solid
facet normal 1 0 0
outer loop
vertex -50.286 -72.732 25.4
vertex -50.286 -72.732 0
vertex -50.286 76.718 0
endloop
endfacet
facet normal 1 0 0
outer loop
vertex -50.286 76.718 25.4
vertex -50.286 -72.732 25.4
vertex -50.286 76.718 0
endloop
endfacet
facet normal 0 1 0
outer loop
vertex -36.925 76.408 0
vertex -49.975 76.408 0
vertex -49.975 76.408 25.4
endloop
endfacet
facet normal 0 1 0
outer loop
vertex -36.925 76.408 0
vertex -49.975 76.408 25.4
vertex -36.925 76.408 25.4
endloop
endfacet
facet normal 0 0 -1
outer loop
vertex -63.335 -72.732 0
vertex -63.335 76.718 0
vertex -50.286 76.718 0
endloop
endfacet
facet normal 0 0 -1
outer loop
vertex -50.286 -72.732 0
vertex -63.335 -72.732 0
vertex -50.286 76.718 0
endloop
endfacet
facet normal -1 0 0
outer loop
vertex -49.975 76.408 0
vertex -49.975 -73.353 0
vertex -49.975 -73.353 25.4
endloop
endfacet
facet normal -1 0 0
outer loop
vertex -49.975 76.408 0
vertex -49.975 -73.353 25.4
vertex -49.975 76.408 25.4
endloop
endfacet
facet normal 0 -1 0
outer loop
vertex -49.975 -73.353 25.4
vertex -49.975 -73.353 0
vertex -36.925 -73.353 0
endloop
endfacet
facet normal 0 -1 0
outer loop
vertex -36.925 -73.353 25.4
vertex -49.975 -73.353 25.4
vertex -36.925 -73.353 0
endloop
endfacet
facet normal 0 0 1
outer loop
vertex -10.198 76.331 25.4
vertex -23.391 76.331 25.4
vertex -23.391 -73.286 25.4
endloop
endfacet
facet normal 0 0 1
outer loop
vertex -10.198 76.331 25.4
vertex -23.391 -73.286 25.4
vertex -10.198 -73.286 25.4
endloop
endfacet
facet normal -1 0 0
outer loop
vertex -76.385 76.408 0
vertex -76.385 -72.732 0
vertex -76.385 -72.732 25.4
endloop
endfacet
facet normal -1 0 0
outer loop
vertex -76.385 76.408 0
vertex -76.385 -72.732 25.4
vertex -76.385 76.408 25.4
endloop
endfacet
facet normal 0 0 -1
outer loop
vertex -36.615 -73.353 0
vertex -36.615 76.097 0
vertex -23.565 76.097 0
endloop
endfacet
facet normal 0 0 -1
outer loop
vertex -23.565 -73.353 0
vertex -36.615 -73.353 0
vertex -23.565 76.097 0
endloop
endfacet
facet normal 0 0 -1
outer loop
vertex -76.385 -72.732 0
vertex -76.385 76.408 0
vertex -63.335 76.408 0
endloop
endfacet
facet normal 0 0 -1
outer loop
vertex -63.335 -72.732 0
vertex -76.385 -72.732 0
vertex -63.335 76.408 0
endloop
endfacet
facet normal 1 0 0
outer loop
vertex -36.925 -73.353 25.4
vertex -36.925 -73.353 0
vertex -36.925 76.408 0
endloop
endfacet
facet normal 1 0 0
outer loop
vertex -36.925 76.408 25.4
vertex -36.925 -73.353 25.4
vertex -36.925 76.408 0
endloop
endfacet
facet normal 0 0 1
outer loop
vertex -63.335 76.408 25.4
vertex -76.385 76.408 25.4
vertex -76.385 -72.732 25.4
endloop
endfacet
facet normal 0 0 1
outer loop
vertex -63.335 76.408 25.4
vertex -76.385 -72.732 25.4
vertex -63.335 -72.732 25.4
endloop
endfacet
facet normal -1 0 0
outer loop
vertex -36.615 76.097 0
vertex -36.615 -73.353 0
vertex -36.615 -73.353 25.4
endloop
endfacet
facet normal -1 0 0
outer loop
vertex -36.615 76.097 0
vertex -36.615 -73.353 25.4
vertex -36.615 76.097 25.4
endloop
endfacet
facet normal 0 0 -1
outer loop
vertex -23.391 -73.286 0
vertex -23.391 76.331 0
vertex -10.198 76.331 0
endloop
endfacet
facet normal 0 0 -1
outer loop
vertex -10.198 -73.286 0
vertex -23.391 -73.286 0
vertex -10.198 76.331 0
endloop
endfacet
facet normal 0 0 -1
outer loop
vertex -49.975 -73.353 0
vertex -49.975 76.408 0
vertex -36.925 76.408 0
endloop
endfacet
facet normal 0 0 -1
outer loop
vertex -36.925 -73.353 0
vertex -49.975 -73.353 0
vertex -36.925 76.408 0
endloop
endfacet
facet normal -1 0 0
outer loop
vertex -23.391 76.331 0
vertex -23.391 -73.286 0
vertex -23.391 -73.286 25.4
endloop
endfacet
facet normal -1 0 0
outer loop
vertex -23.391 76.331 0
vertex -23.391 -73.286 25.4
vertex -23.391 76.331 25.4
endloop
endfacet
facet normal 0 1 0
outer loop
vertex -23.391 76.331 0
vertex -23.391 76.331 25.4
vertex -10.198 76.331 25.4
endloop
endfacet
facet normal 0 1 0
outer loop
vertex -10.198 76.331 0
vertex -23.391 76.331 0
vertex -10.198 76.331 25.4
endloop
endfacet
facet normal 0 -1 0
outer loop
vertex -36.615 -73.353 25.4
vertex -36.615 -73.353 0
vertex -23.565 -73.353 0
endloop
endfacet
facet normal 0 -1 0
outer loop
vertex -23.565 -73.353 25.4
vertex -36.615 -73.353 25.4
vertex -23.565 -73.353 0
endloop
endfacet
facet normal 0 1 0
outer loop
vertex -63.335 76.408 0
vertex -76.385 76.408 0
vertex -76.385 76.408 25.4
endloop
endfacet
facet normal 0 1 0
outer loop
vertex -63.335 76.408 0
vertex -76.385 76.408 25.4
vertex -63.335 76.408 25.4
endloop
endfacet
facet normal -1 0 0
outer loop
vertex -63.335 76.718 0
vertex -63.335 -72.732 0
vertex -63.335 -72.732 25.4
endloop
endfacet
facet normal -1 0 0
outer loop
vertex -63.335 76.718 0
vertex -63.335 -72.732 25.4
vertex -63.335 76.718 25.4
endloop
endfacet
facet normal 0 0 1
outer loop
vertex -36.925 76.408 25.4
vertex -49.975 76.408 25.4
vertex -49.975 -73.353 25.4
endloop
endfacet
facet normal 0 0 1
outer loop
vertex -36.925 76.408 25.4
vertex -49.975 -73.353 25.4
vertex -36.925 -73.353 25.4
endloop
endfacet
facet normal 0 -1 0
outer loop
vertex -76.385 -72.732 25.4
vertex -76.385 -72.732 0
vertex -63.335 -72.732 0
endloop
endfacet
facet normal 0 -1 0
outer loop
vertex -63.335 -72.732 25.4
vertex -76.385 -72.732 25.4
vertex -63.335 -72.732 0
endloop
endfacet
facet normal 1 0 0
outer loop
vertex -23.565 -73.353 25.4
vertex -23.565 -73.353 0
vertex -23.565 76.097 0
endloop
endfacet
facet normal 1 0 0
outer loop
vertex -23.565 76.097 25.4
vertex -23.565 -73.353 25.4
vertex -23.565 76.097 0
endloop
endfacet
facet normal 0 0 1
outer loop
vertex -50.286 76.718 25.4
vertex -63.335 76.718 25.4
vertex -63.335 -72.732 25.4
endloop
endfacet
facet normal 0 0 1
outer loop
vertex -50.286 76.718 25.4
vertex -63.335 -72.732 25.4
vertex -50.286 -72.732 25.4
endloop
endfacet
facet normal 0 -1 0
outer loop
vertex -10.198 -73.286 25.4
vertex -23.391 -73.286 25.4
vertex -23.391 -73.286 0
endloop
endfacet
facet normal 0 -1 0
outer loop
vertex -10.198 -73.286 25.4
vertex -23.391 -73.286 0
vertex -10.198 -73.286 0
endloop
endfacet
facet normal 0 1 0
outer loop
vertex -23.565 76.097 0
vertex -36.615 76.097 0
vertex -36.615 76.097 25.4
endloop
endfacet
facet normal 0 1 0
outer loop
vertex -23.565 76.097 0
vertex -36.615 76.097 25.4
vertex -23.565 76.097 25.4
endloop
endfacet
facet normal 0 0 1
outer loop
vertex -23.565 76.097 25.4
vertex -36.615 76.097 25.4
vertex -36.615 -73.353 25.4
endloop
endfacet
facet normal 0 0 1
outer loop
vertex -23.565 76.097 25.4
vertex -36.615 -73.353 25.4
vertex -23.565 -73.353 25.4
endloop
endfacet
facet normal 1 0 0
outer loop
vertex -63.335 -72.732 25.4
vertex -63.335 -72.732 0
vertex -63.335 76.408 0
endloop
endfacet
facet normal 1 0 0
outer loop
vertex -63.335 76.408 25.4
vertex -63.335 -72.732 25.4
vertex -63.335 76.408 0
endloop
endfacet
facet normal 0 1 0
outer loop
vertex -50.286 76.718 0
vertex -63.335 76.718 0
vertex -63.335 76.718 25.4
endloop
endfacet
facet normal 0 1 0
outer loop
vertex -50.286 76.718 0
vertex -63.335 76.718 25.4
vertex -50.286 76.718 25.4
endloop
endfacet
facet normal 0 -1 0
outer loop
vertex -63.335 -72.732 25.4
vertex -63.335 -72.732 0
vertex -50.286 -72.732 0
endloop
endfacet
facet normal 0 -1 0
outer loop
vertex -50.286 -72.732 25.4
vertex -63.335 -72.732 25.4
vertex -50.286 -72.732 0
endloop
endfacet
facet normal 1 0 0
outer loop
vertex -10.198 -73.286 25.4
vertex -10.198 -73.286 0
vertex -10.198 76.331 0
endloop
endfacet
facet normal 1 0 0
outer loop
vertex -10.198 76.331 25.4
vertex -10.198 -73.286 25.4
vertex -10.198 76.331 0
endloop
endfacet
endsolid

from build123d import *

# Parameters (mm, degrees)
F0_W     = 13.0496844649
F0_H     = 149.1392925382
F5_DEPTH = 25.4
F1_W     = 13.0496919155
F1_H     = 149.4499966502
F2_W     = 13.0496881902
F2_H     = 149.4499966502
F3_W     = 13.0496881902
F3_H     = 149.7607082129
F4_W     = 13.1932226941
F4_H     = 149.6167555451


with BuildPart() as f5:
    # F0 (on Top) → F5 (new body)
    with BuildSketch(Plane.XY):
        with Locations((-69.8602385819, 1.838054508)):
            Rectangle(F0_W, F0_H)
    extrude(amount=F5_DEPTH)


with BuildPart() as f5b:
    # F1 (on Top) → F5, piece 2 (new body)
    with BuildSketch(Plane.XY):
        with Locations((-56.8105503917, 1.993406564)):
            Rectangle(F1_W, F1_H)
    extrude(amount=F5_DEPTH)


with BuildPart() as f5c:
    # F2 (on Top) → F5, piece 3 (new body)
    with BuildSketch(Plane.XY):
        with Locations((-30.0897601992, 1.3719908893)):
            Rectangle(F2_W, F2_H)
    extrude(amount=F5_DEPTH)


with BuildPart() as f5d:
    # F3 (on Top) → F5, piece 4 (new body)
    with BuildSketch(Plane.XY):
        with Locations((-43.4501562268, 1.5273466706)):
            Rectangle(F3_W, F3_H)
    extrude(amount=F5_DEPTH)


with BuildPart() as f5e:
    # F4 (on Top) → F5, piece 5 (new body)
    with BuildSketch(Plane.XY):
        with Locations((-16.7945981957, 1.5223808587)):
            Rectangle(F4_W, F4_H)
    extrude(amount=F5_DEPTH)


solid = Compound([f5.part, f5b.part, f5c.part, f5d.part, f5e.part])
